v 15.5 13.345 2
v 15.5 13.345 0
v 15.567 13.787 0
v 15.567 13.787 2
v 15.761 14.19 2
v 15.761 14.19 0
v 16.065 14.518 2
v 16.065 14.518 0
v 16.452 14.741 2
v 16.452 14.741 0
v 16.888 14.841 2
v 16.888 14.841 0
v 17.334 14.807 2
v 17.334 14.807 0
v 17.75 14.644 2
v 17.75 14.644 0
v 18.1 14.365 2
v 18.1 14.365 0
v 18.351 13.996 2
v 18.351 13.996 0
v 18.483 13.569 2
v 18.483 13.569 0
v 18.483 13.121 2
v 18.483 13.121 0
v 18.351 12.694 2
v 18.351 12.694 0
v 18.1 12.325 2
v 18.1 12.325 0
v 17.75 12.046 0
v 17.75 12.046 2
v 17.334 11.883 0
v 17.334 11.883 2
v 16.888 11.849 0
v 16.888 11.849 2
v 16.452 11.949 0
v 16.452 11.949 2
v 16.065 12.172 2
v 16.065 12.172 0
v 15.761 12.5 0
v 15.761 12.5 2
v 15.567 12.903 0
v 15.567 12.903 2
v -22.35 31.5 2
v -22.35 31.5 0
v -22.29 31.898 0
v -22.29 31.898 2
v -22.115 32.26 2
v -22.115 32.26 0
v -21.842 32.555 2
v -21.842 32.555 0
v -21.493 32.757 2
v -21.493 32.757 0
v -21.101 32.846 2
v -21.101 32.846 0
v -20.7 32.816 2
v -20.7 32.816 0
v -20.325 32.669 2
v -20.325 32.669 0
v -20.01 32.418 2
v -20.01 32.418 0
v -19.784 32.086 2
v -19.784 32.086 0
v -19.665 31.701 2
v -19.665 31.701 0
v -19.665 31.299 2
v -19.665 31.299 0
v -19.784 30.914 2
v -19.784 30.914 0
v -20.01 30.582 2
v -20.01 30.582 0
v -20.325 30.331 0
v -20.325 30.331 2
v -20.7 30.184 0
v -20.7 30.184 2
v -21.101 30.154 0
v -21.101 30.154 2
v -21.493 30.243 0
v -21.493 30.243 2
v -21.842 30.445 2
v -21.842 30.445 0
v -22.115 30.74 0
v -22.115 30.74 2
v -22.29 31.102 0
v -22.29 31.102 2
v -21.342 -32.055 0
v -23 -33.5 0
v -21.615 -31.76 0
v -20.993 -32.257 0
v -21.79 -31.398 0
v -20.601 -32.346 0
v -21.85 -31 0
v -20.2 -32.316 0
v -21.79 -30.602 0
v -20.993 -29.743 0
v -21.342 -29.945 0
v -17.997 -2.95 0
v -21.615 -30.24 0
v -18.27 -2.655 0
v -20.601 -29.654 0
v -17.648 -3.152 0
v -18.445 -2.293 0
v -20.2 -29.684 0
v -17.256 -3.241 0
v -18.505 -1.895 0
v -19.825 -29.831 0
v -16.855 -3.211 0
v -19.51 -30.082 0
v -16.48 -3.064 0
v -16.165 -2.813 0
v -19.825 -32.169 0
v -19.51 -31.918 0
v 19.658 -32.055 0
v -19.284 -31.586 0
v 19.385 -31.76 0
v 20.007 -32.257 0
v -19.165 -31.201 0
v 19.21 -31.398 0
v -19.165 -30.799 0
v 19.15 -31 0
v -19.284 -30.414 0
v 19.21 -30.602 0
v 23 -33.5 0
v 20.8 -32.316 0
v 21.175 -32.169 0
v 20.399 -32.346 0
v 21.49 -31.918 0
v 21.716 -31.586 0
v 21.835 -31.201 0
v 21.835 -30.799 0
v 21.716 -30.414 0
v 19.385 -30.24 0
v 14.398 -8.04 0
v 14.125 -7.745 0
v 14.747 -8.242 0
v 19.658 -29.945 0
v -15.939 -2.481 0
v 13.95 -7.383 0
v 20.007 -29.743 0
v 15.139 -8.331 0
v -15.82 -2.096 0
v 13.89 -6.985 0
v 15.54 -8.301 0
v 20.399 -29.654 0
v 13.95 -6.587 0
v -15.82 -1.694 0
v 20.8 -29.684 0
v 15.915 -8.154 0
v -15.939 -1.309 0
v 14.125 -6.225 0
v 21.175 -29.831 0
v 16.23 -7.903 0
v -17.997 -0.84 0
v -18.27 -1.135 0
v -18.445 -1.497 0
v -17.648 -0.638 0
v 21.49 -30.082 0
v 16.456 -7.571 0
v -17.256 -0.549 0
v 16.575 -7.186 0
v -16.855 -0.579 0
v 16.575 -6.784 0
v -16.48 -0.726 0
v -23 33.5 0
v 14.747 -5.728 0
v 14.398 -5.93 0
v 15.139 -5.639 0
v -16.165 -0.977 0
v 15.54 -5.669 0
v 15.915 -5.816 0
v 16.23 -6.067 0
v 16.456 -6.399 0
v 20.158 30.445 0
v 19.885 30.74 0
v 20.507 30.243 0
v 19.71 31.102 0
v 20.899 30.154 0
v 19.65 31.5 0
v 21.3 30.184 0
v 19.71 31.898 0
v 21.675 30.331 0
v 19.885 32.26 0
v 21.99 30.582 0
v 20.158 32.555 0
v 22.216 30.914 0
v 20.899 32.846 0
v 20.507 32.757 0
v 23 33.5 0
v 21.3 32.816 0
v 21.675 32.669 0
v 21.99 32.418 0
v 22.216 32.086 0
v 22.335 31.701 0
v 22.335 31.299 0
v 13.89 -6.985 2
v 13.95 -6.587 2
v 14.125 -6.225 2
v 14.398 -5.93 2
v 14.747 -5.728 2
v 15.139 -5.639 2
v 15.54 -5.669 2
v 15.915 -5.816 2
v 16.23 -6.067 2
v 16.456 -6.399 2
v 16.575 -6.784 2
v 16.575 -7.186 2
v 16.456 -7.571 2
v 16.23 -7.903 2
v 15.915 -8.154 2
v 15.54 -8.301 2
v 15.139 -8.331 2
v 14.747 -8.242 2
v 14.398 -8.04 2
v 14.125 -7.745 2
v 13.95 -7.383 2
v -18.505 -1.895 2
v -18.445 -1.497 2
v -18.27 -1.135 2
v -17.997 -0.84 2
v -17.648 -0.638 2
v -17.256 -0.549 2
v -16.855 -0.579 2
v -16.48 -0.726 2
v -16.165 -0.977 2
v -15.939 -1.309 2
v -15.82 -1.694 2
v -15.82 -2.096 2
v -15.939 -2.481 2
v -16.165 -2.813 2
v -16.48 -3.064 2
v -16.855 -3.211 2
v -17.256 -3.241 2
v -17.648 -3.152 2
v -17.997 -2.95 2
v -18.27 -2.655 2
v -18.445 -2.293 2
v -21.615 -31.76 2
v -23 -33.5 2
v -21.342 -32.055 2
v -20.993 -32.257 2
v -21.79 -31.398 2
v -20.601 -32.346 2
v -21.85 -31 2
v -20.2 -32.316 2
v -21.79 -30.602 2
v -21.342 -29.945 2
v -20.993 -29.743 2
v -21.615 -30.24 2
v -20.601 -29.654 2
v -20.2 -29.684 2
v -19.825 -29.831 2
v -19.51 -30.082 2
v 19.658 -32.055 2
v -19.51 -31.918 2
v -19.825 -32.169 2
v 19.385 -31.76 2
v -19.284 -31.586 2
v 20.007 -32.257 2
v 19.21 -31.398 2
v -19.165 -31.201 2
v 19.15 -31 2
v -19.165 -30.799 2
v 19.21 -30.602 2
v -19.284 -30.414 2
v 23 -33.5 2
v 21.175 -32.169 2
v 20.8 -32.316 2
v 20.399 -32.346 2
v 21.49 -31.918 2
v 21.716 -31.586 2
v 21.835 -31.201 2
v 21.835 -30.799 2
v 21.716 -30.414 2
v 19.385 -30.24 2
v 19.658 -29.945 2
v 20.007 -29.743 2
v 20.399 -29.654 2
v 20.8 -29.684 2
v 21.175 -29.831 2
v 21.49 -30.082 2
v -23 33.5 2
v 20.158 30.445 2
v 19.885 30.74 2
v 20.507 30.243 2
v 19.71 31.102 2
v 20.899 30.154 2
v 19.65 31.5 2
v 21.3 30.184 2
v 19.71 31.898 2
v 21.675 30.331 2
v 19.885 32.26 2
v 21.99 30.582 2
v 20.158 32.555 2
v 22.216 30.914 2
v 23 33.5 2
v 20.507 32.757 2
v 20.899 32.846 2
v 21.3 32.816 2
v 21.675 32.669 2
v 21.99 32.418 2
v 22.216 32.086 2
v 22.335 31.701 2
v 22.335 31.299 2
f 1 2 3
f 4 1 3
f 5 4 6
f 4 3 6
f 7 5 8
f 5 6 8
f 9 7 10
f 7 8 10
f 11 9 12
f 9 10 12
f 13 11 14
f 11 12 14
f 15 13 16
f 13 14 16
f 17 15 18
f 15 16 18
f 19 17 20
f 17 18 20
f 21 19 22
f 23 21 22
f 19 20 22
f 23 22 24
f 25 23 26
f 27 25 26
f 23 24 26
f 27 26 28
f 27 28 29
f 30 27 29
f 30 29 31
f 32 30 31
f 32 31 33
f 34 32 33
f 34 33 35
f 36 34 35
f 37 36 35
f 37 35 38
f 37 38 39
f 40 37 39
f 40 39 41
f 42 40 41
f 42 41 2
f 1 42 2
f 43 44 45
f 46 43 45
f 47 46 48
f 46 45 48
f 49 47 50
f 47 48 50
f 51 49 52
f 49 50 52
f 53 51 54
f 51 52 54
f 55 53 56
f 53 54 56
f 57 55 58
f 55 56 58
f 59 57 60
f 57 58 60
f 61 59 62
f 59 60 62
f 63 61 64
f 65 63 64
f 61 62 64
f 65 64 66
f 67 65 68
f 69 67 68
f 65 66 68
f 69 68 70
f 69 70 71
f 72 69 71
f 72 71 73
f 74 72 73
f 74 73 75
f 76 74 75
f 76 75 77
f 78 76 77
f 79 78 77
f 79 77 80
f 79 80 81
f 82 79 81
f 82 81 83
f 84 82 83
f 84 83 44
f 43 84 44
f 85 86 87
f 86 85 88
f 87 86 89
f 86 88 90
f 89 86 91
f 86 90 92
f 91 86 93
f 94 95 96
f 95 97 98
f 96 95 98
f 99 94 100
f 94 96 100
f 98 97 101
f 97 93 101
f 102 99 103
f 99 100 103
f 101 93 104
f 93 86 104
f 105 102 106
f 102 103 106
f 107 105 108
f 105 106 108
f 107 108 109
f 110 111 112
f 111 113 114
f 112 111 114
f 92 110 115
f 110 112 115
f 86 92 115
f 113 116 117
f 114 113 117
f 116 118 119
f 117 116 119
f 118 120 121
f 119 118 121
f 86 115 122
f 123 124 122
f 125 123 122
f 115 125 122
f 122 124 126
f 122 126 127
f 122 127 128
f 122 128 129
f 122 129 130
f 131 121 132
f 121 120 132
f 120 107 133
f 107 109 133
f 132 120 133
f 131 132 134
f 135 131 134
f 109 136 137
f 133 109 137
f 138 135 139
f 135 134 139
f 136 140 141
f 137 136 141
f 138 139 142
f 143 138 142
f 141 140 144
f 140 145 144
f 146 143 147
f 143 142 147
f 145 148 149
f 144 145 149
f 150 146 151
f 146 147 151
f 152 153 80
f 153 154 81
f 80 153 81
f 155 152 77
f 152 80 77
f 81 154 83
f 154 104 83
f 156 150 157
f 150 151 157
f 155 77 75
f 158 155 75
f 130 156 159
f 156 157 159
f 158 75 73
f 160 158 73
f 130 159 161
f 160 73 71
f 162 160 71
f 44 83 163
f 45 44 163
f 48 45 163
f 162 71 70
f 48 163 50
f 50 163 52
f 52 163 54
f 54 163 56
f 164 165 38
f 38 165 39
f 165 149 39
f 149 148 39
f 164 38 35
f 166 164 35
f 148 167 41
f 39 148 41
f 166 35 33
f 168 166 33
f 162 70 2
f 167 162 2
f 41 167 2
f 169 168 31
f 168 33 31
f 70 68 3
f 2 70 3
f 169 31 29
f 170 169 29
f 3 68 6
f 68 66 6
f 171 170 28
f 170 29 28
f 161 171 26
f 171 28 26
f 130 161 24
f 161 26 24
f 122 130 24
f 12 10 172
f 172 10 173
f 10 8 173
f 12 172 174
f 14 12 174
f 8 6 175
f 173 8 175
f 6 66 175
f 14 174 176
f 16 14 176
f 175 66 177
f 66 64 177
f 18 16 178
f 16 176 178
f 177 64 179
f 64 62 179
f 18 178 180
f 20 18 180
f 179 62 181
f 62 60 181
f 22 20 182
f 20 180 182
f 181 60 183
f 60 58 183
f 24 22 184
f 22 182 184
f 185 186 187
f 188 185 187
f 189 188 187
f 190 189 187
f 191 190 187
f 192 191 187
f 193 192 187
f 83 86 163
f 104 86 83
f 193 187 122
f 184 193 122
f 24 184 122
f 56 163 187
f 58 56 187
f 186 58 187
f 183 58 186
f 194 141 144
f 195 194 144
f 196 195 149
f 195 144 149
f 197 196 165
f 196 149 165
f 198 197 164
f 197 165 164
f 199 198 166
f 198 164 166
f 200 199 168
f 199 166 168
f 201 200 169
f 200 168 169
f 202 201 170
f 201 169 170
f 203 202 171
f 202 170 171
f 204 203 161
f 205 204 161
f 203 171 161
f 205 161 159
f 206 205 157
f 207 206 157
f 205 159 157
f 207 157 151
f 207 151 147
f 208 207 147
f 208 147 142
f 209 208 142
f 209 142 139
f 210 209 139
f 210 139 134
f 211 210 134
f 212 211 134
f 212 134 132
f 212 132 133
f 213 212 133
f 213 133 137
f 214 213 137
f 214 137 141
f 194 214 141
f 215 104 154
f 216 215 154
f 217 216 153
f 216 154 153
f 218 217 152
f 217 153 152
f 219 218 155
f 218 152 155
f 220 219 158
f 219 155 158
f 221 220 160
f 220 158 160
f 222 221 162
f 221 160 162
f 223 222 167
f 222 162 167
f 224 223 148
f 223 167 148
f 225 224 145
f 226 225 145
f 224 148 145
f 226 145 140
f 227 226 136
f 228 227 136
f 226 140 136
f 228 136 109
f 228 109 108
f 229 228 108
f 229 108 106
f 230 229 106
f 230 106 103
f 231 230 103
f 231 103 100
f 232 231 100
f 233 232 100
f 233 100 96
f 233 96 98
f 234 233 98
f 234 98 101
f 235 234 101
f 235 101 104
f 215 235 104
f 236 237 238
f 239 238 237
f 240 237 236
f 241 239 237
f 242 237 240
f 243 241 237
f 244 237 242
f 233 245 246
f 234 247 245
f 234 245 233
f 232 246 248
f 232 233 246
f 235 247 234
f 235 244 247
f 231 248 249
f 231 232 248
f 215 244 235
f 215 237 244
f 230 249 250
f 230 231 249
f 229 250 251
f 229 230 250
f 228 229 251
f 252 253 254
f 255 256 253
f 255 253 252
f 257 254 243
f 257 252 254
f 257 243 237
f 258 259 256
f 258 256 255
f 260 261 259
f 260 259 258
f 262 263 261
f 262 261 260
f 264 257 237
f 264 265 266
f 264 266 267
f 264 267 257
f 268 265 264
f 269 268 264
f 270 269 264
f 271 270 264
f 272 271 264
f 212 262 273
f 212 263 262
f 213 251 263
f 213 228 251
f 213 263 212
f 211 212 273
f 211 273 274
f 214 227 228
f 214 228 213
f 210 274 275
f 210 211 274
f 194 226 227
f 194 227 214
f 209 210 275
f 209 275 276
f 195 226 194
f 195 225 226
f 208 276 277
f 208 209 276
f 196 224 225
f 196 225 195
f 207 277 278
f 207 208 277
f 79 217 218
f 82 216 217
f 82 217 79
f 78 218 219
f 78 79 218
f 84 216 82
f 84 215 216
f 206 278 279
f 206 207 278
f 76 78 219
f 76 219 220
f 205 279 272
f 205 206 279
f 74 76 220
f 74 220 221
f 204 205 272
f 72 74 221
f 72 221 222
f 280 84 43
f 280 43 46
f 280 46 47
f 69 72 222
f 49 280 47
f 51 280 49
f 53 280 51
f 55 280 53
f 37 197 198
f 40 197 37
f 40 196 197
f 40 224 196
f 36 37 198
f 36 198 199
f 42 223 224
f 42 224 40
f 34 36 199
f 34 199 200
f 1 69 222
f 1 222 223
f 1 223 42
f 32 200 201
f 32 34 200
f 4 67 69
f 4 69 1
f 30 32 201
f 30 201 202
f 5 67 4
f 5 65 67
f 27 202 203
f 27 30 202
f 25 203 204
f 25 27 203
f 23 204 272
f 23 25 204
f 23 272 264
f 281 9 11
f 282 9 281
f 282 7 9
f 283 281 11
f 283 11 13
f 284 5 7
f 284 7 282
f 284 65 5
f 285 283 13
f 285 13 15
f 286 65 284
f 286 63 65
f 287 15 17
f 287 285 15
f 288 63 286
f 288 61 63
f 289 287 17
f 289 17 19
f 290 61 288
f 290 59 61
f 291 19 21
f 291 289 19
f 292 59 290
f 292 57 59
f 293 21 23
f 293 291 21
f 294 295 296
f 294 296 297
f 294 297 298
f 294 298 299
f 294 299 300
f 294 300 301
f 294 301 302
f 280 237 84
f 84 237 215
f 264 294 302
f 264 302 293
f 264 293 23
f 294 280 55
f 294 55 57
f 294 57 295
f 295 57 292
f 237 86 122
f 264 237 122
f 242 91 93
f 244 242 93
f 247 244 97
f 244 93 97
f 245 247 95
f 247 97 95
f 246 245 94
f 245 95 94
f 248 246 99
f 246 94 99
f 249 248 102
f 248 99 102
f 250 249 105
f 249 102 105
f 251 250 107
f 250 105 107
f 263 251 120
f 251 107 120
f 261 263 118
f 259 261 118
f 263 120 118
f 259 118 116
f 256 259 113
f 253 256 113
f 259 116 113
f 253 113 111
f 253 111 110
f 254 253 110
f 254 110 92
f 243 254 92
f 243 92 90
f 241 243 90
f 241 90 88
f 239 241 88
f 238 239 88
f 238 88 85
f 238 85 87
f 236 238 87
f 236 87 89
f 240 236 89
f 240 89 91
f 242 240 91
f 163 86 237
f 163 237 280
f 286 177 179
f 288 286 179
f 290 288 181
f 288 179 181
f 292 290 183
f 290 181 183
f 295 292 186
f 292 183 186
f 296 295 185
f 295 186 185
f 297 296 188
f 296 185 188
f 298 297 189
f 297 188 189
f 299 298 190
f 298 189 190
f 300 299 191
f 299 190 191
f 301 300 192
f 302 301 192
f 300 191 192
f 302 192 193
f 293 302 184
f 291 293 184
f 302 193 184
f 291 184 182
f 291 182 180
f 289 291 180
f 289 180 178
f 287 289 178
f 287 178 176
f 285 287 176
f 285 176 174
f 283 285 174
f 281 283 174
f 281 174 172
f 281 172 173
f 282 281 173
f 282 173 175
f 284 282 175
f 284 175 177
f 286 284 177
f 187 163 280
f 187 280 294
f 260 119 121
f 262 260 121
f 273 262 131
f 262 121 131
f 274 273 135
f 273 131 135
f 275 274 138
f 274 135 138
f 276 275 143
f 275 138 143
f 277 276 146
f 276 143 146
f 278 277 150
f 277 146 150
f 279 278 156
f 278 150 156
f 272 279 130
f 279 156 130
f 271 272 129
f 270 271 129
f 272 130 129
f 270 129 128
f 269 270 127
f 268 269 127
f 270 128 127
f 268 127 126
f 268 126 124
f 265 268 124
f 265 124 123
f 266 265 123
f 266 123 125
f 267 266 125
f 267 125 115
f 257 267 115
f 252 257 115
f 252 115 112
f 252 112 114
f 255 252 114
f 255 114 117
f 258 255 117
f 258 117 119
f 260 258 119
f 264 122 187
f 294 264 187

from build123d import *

# Parameters (mm, degrees)
SKETCH1_W                  = 46
SKETCH1_H                  = 67
BOSS_EXTRUDE1_DEPTH        = 2
F_2_7_2_7_DIAMETER_HOLE1_D = 2.7
F_3_0_3_DIAMETER_HOLE1_D   = 3


with BuildPart() as part:
    # Sketch1 → Boss-Extrude1 (new body)
    with BuildSketch(Plane.XY):
        Rectangle(SKETCH1_W, SKETCH1_H)
    extrude(amount=BOSS_EXTRUDE1_DEPTH)

    # Ø2.7 (2.7) Diameter Hole1 (through all)
    with Locations(Plane.XY.offset(2)):
        with Locations((-21, 31.5), (21, 31.5), (20.5, -31), (-20.5, -31), (-17.155, -1.895), (15.24, -6.985)):
            Hole(F_2_7_2_7_DIAMETER_HOLE1_D / 2)

    # Ø3.0 (3) Diameter Hole1 (through all)
    with Locations(Plane.XY.offset(2)):
        with Locations((17, 13.345)):
            Hole(F_3_0_3_DIAMETER_HOLE1_D / 2)


solid = part.part
